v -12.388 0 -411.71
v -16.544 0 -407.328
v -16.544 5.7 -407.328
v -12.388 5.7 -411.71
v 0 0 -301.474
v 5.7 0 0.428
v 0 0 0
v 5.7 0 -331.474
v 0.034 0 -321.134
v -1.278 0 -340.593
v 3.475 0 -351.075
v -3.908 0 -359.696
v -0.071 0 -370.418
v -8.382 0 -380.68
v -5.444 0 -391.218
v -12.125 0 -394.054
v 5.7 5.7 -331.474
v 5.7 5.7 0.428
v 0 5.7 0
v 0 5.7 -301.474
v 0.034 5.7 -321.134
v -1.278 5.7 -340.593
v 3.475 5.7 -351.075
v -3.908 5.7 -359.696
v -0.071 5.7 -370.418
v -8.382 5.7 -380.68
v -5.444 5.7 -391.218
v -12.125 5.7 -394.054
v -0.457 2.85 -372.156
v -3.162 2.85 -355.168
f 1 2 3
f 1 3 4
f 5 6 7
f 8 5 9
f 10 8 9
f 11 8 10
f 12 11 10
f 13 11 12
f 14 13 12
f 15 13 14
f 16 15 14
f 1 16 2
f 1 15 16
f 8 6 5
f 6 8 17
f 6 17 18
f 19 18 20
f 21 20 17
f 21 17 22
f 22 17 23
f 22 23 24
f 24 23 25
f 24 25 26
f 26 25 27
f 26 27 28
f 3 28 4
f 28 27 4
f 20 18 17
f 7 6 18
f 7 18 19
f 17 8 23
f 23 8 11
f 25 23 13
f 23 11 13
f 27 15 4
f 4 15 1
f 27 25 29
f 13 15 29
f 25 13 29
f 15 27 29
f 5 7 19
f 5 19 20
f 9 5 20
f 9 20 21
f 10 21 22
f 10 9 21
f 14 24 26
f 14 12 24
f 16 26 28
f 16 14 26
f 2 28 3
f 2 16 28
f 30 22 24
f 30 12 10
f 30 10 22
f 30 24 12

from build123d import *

# Parameters (mm, degrees)
BOSS_EXTRUDE1_DEPTH = 5.7


with BuildPart() as part:
    # Sketch1 → Boss-Extrude1 (new body)
    with BuildSketch(Plane(origin=(0, 0, 0), x_dir=(1, 0, 0), z_dir=(0, 1, 0))):
        with BuildLine():
            Line((0, 0), (0, 301.474))
            add(Edge.make_bspline(
                [(0, 301.474), (1.947152909, 355.934632045), (-16.543745931, 407.327520261)],
                knots=[0, 0, 0, 1, 1, 1], degree=2))
            Line((-16.543745931, 407.327520261), (-12.38816914, 411.710423204))
            add(Edge.make_bspline(
                [(5.7, 331.474), (2.429624829, 372.720008317), (-12.38816914, 411.710423204)],
                knots=[0, 0, 0, 1, 1, 1], degree=2))
            Line((5.7, 331.474), (5.7, 0))
            Line((5.7, 0), (5.7, -0.427567417))
            Line((5.7, -0.427567417), (0, 0))
        make_face()
    extrude(amount=BOSS_EXTRUDE1_DEPTH)


solid = part.part
